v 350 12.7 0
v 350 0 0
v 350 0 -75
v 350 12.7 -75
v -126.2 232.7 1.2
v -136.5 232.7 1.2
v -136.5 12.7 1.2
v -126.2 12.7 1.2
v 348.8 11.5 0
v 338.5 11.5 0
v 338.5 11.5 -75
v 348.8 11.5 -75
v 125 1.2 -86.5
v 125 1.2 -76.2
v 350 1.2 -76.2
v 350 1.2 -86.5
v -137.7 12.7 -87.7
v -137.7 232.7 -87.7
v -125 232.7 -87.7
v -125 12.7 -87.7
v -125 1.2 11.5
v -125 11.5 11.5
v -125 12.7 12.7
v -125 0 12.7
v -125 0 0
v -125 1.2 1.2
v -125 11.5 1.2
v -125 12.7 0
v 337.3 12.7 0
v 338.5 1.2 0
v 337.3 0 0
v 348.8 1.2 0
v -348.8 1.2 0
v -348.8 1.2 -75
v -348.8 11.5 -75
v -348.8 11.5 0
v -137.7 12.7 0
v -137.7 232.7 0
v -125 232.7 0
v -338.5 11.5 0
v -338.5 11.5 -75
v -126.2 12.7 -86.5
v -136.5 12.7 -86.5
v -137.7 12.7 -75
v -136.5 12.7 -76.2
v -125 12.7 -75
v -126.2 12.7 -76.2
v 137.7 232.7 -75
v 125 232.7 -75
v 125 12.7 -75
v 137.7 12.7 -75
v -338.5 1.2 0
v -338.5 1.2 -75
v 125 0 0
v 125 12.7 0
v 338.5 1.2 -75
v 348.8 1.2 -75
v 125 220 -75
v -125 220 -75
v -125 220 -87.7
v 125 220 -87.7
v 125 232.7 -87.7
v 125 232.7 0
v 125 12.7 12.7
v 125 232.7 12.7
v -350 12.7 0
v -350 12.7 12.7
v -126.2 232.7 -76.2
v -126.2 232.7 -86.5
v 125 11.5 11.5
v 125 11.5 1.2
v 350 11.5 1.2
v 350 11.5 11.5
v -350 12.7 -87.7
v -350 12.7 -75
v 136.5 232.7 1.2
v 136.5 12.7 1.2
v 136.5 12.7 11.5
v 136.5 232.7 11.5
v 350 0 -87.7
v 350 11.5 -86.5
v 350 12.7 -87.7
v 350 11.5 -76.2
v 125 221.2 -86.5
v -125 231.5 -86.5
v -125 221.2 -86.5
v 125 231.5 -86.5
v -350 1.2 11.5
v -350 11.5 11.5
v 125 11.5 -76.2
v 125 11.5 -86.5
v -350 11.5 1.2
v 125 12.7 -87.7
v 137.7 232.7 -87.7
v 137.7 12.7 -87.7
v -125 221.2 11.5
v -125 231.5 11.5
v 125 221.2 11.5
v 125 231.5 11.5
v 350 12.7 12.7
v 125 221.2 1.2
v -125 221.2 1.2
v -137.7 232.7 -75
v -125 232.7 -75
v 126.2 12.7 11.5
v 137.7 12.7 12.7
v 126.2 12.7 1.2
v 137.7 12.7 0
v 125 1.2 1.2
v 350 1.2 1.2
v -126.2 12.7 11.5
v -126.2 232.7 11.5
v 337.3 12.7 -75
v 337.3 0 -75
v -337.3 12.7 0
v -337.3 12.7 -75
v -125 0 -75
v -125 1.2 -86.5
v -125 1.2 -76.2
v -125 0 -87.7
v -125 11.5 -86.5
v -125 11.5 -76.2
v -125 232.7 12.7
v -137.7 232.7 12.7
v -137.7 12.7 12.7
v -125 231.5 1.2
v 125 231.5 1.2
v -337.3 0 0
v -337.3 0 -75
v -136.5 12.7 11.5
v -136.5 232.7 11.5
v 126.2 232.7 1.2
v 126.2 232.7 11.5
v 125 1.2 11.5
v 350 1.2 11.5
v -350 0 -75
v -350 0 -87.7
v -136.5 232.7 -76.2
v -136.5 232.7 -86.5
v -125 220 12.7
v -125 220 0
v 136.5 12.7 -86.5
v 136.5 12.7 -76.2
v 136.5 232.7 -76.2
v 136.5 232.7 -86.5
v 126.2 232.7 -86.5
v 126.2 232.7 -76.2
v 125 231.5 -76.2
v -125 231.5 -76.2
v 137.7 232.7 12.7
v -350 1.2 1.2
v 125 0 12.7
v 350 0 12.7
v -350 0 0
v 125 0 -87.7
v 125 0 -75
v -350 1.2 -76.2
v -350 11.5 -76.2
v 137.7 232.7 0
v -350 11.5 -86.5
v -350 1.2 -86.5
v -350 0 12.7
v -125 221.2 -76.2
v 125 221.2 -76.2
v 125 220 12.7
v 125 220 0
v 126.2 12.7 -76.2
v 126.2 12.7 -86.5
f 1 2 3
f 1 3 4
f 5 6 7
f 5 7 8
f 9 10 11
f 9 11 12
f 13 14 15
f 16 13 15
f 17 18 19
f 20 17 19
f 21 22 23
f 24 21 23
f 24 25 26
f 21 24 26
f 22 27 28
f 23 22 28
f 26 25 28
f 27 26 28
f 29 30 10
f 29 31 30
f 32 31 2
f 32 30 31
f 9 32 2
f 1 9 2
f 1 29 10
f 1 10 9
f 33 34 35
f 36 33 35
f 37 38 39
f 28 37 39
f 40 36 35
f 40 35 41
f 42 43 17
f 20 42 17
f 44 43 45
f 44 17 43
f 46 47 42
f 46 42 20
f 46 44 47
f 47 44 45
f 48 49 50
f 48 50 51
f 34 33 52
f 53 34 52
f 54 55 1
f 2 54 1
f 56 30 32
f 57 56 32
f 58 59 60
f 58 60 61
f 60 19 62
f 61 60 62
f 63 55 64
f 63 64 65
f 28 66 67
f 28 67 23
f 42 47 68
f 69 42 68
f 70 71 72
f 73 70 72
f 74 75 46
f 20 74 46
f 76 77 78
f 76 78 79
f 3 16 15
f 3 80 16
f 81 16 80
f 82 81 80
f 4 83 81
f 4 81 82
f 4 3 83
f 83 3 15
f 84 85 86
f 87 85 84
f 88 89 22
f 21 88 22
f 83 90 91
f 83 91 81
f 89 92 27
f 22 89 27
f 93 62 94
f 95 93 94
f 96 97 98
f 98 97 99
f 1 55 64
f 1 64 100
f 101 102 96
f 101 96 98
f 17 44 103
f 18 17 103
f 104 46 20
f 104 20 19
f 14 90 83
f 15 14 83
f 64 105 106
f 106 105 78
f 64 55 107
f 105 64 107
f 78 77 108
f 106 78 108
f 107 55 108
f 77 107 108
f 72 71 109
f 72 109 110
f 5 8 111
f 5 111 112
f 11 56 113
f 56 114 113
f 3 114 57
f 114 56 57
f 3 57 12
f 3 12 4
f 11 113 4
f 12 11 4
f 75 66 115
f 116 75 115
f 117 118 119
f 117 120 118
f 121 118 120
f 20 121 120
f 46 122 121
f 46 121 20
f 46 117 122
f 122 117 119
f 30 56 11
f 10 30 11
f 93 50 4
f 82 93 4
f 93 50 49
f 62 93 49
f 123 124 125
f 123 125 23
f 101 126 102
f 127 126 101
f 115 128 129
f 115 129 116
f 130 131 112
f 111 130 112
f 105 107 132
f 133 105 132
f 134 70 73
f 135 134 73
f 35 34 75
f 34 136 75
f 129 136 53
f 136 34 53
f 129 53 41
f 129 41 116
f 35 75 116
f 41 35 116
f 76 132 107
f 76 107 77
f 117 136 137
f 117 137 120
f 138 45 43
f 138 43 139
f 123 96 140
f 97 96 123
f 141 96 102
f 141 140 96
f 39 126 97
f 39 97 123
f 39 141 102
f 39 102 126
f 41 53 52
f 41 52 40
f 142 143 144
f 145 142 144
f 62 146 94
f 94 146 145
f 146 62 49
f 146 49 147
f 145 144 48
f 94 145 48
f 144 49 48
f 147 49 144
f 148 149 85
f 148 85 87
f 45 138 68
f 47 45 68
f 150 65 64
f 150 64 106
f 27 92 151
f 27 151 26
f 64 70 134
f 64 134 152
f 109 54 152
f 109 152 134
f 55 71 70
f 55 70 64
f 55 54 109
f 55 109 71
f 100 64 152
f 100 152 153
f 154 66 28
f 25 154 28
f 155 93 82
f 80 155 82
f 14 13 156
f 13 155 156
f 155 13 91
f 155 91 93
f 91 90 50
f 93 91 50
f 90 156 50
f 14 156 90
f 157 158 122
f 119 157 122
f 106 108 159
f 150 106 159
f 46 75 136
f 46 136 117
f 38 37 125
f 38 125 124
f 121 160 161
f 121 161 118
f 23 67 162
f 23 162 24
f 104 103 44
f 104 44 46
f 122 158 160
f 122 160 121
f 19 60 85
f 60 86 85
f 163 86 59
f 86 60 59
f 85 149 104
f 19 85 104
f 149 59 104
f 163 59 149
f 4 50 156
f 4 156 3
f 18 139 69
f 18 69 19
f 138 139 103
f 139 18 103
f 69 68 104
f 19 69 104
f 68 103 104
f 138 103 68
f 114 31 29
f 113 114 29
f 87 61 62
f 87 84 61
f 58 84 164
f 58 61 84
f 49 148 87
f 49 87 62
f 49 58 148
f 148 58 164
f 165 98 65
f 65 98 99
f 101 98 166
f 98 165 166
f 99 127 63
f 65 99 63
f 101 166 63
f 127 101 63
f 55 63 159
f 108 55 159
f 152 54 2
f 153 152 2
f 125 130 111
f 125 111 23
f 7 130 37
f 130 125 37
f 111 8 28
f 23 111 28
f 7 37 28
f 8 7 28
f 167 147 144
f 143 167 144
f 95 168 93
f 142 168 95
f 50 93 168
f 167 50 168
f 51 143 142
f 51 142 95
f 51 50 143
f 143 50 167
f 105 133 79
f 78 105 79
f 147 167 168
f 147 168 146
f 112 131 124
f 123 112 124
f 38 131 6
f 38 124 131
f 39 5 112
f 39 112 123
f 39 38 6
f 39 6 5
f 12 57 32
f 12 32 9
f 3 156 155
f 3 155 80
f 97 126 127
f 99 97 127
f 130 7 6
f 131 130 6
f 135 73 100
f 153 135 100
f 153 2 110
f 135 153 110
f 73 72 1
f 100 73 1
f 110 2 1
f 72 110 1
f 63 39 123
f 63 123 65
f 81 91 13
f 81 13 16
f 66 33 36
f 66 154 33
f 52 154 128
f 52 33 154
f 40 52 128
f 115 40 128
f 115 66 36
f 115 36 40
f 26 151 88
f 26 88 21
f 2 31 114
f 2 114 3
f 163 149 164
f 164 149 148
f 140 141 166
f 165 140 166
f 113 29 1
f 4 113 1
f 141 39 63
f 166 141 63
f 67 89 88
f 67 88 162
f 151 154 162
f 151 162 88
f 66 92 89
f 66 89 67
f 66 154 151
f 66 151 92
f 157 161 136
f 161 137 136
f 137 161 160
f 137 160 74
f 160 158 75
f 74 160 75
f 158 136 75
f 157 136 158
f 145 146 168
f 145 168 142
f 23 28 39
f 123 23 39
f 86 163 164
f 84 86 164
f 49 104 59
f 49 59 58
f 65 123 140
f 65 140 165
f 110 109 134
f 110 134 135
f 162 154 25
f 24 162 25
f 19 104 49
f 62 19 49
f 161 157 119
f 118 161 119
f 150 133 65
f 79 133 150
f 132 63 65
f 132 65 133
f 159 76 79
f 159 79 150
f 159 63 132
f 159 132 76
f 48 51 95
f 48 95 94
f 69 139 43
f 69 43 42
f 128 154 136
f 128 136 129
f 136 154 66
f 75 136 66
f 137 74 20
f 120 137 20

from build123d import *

# Parameters (mm, degrees)
SKETCH3_W             = 225
SKETCH3_H             = 12.7
BOSS_EXTRUDE1_DEPTH   = 12.7
SKETCH3_W_2           = 250
BOSS_EXTRUDE1_2_DEPTH = 12.7
BOSS_EXTRUDE1_3_DEPTH = 12.7
SHELL1_T              = -1.2
SHELL2_T              = -1.2
SHELL3_T              = -1.2
SKETCH3_3_W           = 12.7
SKETCH3_3_H           = 220
BOSS_EXTRUDE2_DEPTH   = 12.7
BOSS_EXTRUDE2_2_DEPTH = 12.7
SHELL4_T              = -1.2
SHELL5_T              = -1.2
SKETCH3_4_W           = 12.7
SKETCH3_4_H           = 12.7
BOSS_EXTRUDE3_DEPTH   = 75
BOSS_EXTRUDE3_2_DEPTH = 75
SHELL6_T              = -1.2
SHELL7_T              = -1.2


with BuildPart() as part:
    # Sketch3 → Boss-Extrude1 (new body)
    with BuildSketch(Plane.XY):
        with Locations((-237.5, 6.35)):
            Rectangle(SKETCH3_W, SKETCH3_H)
    extrude(amount=BOSS_EXTRUDE1_DEPTH)

    # Shell1
    shell1_openings = [part.faces().sort_by_distance(p)[0] for p in [
        (-125, 6.35, 6.35),
        (-350, 6.35, 6.35),
    ]]
    offset(amount=SHELL1_T, openings=shell1_openings, kind=Kind.INTERSECTION)


with BuildPart() as body_2:
    # Sketch3 → Boss-Extrude1 2 (new body)
    with BuildSketch(Plane.XY):
        with Locations((0, 226.35)):
            Rectangle(SKETCH3_W_2, SKETCH3_H)
    extrude(amount=BOSS_EXTRUDE1_2_DEPTH)

    # Shell2
    shell2_openings = [body_2.faces().sort_by_distance(p)[0] for p in [
        (-125, 226.35, 6.35),
        (125, 226.35, 6.35),
    ]]
    offset(amount=SHELL2_T, openings=shell2_openings, kind=Kind.INTERSECTION)


with BuildPart() as body_3:
    # Sketch3 → Boss-Extrude1 3 (new body)
    with BuildSketch(Plane.XY):
        with Locations((237.5, 6.35)):
            Rectangle(SKETCH3_W, SKETCH3_H)
    extrude(amount=BOSS_EXTRUDE1_3_DEPTH)

    # Shell3
    shell3_openings = [body_3.faces().sort_by_distance(p)[0] for p in [
        (125, 6.35, 6.35),
        (350, 6.35, 6.35),
    ]]
    offset(amount=SHELL3_T, openings=shell3_openings, kind=Kind.INTERSECTION)


with BuildPart() as body_4:
    # Sketch3<3> → Boss-Extrude2 (new body)
    with BuildSketch(Plane.XY):
        with Locations((-131.35, 122.7)):
            Rectangle(SKETCH3_3_W, SKETCH3_3_H)
    extrude(amount=BOSS_EXTRUDE2_DEPTH)

    # Shell4
    shell4_openings = [body_4.faces().sort_by_distance(p)[0] for p in [
        (-131.35, 232.7, 6.35),
        (-131.35, 12.7, 6.35),
    ]]
    offset(amount=SHELL4_T, openings=shell4_openings, kind=Kind.INTERSECTION)


with BuildPart() as body_5:
    # Sketch3<3> → Boss-Extrude2 2 (new body)
    with BuildSketch(Plane.XY):
        with Locations((131.35, 122.7)):
            Rectangle(SKETCH3_3_W, SKETCH3_3_H)
    extrude(amount=BOSS_EXTRUDE2_2_DEPTH)

    # Shell5
    shell5_openings = [body_5.faces().sort_by_distance(p)[0] for p in [
        (131.35, 232.7, 6.35),
        (131.35, 12.7, 6.35),
    ]]
    offset(amount=SHELL5_T, openings=shell5_openings, kind=Kind.INTERSECTION)


with BuildPart() as body_6:
    # Sketch3<4> → Boss-Extrude3 (new body)
    with BuildSketch(Plane.XY):
        with Locations((-343.65, 6.35)):
            Rectangle(SKETCH3_4_W, SKETCH3_4_H)
    extrude(amount=-BOSS_EXTRUDE3_DEPTH)

    # Shell7
    shell7_openings = [body_6.faces().sort_by_distance(p)[0] for p in [
        (-343.65, 6.35, -75),
        (-343.65, 6.35, 0),
    ]]
    offset(amount=SHELL7_T, openings=shell7_openings, kind=Kind.INTERSECTION)


with BuildPart() as body_7:
    # Sketch3<4> → Boss-Extrude3 2 (new body)
    with BuildSketch(Plane.XY):
        with Locations((343.65, 6.35)):
            Rectangle(SKETCH3_4_W, SKETCH3_4_H)
    extrude(amount=-BOSS_EXTRUDE3_2_DEPTH)

    # Shell6
    shell6_openings = [body_7.faces().sort_by_distance(p)[0] for p in [
        (343.65, 6.35, -75),
        (343.65, 6.35, 0),
    ]]
    offset(amount=SHELL6_T, openings=shell6_openings, kind=Kind.INTERSECTION)


with BuildPart() as body_8:
    # Mirror1: mirrored copy
    add(part.part.mirror(Plane.XY.offset(-37.5)))


with BuildPart() as body_9:
    # Mirror1 2: mirrored copy
    add(body_2.part.mirror(Plane.XY.offset(-37.5)))


with BuildPart() as body_10:
    # Mirror1 3: mirrored copy
    add(body_3.part.mirror(Plane.XY.offset(-37.5)))


with BuildPart() as body_11:
    # Mirror1 4: mirrored copy
    add(body_4.part.mirror(Plane.XY.offset(-37.5)))


with BuildPart() as body_12:
    # Mirror1 5: mirrored copy
    add(body_5.part.mirror(Plane.XY.offset(-37.5)))


solid = Compound([part.part, body_2.part, body_3.part, body_4.part, body_5.part, body_6.part, body_7.part, body_8.part, body_9.part, body_10.part, body_11.part, body_12.part])
